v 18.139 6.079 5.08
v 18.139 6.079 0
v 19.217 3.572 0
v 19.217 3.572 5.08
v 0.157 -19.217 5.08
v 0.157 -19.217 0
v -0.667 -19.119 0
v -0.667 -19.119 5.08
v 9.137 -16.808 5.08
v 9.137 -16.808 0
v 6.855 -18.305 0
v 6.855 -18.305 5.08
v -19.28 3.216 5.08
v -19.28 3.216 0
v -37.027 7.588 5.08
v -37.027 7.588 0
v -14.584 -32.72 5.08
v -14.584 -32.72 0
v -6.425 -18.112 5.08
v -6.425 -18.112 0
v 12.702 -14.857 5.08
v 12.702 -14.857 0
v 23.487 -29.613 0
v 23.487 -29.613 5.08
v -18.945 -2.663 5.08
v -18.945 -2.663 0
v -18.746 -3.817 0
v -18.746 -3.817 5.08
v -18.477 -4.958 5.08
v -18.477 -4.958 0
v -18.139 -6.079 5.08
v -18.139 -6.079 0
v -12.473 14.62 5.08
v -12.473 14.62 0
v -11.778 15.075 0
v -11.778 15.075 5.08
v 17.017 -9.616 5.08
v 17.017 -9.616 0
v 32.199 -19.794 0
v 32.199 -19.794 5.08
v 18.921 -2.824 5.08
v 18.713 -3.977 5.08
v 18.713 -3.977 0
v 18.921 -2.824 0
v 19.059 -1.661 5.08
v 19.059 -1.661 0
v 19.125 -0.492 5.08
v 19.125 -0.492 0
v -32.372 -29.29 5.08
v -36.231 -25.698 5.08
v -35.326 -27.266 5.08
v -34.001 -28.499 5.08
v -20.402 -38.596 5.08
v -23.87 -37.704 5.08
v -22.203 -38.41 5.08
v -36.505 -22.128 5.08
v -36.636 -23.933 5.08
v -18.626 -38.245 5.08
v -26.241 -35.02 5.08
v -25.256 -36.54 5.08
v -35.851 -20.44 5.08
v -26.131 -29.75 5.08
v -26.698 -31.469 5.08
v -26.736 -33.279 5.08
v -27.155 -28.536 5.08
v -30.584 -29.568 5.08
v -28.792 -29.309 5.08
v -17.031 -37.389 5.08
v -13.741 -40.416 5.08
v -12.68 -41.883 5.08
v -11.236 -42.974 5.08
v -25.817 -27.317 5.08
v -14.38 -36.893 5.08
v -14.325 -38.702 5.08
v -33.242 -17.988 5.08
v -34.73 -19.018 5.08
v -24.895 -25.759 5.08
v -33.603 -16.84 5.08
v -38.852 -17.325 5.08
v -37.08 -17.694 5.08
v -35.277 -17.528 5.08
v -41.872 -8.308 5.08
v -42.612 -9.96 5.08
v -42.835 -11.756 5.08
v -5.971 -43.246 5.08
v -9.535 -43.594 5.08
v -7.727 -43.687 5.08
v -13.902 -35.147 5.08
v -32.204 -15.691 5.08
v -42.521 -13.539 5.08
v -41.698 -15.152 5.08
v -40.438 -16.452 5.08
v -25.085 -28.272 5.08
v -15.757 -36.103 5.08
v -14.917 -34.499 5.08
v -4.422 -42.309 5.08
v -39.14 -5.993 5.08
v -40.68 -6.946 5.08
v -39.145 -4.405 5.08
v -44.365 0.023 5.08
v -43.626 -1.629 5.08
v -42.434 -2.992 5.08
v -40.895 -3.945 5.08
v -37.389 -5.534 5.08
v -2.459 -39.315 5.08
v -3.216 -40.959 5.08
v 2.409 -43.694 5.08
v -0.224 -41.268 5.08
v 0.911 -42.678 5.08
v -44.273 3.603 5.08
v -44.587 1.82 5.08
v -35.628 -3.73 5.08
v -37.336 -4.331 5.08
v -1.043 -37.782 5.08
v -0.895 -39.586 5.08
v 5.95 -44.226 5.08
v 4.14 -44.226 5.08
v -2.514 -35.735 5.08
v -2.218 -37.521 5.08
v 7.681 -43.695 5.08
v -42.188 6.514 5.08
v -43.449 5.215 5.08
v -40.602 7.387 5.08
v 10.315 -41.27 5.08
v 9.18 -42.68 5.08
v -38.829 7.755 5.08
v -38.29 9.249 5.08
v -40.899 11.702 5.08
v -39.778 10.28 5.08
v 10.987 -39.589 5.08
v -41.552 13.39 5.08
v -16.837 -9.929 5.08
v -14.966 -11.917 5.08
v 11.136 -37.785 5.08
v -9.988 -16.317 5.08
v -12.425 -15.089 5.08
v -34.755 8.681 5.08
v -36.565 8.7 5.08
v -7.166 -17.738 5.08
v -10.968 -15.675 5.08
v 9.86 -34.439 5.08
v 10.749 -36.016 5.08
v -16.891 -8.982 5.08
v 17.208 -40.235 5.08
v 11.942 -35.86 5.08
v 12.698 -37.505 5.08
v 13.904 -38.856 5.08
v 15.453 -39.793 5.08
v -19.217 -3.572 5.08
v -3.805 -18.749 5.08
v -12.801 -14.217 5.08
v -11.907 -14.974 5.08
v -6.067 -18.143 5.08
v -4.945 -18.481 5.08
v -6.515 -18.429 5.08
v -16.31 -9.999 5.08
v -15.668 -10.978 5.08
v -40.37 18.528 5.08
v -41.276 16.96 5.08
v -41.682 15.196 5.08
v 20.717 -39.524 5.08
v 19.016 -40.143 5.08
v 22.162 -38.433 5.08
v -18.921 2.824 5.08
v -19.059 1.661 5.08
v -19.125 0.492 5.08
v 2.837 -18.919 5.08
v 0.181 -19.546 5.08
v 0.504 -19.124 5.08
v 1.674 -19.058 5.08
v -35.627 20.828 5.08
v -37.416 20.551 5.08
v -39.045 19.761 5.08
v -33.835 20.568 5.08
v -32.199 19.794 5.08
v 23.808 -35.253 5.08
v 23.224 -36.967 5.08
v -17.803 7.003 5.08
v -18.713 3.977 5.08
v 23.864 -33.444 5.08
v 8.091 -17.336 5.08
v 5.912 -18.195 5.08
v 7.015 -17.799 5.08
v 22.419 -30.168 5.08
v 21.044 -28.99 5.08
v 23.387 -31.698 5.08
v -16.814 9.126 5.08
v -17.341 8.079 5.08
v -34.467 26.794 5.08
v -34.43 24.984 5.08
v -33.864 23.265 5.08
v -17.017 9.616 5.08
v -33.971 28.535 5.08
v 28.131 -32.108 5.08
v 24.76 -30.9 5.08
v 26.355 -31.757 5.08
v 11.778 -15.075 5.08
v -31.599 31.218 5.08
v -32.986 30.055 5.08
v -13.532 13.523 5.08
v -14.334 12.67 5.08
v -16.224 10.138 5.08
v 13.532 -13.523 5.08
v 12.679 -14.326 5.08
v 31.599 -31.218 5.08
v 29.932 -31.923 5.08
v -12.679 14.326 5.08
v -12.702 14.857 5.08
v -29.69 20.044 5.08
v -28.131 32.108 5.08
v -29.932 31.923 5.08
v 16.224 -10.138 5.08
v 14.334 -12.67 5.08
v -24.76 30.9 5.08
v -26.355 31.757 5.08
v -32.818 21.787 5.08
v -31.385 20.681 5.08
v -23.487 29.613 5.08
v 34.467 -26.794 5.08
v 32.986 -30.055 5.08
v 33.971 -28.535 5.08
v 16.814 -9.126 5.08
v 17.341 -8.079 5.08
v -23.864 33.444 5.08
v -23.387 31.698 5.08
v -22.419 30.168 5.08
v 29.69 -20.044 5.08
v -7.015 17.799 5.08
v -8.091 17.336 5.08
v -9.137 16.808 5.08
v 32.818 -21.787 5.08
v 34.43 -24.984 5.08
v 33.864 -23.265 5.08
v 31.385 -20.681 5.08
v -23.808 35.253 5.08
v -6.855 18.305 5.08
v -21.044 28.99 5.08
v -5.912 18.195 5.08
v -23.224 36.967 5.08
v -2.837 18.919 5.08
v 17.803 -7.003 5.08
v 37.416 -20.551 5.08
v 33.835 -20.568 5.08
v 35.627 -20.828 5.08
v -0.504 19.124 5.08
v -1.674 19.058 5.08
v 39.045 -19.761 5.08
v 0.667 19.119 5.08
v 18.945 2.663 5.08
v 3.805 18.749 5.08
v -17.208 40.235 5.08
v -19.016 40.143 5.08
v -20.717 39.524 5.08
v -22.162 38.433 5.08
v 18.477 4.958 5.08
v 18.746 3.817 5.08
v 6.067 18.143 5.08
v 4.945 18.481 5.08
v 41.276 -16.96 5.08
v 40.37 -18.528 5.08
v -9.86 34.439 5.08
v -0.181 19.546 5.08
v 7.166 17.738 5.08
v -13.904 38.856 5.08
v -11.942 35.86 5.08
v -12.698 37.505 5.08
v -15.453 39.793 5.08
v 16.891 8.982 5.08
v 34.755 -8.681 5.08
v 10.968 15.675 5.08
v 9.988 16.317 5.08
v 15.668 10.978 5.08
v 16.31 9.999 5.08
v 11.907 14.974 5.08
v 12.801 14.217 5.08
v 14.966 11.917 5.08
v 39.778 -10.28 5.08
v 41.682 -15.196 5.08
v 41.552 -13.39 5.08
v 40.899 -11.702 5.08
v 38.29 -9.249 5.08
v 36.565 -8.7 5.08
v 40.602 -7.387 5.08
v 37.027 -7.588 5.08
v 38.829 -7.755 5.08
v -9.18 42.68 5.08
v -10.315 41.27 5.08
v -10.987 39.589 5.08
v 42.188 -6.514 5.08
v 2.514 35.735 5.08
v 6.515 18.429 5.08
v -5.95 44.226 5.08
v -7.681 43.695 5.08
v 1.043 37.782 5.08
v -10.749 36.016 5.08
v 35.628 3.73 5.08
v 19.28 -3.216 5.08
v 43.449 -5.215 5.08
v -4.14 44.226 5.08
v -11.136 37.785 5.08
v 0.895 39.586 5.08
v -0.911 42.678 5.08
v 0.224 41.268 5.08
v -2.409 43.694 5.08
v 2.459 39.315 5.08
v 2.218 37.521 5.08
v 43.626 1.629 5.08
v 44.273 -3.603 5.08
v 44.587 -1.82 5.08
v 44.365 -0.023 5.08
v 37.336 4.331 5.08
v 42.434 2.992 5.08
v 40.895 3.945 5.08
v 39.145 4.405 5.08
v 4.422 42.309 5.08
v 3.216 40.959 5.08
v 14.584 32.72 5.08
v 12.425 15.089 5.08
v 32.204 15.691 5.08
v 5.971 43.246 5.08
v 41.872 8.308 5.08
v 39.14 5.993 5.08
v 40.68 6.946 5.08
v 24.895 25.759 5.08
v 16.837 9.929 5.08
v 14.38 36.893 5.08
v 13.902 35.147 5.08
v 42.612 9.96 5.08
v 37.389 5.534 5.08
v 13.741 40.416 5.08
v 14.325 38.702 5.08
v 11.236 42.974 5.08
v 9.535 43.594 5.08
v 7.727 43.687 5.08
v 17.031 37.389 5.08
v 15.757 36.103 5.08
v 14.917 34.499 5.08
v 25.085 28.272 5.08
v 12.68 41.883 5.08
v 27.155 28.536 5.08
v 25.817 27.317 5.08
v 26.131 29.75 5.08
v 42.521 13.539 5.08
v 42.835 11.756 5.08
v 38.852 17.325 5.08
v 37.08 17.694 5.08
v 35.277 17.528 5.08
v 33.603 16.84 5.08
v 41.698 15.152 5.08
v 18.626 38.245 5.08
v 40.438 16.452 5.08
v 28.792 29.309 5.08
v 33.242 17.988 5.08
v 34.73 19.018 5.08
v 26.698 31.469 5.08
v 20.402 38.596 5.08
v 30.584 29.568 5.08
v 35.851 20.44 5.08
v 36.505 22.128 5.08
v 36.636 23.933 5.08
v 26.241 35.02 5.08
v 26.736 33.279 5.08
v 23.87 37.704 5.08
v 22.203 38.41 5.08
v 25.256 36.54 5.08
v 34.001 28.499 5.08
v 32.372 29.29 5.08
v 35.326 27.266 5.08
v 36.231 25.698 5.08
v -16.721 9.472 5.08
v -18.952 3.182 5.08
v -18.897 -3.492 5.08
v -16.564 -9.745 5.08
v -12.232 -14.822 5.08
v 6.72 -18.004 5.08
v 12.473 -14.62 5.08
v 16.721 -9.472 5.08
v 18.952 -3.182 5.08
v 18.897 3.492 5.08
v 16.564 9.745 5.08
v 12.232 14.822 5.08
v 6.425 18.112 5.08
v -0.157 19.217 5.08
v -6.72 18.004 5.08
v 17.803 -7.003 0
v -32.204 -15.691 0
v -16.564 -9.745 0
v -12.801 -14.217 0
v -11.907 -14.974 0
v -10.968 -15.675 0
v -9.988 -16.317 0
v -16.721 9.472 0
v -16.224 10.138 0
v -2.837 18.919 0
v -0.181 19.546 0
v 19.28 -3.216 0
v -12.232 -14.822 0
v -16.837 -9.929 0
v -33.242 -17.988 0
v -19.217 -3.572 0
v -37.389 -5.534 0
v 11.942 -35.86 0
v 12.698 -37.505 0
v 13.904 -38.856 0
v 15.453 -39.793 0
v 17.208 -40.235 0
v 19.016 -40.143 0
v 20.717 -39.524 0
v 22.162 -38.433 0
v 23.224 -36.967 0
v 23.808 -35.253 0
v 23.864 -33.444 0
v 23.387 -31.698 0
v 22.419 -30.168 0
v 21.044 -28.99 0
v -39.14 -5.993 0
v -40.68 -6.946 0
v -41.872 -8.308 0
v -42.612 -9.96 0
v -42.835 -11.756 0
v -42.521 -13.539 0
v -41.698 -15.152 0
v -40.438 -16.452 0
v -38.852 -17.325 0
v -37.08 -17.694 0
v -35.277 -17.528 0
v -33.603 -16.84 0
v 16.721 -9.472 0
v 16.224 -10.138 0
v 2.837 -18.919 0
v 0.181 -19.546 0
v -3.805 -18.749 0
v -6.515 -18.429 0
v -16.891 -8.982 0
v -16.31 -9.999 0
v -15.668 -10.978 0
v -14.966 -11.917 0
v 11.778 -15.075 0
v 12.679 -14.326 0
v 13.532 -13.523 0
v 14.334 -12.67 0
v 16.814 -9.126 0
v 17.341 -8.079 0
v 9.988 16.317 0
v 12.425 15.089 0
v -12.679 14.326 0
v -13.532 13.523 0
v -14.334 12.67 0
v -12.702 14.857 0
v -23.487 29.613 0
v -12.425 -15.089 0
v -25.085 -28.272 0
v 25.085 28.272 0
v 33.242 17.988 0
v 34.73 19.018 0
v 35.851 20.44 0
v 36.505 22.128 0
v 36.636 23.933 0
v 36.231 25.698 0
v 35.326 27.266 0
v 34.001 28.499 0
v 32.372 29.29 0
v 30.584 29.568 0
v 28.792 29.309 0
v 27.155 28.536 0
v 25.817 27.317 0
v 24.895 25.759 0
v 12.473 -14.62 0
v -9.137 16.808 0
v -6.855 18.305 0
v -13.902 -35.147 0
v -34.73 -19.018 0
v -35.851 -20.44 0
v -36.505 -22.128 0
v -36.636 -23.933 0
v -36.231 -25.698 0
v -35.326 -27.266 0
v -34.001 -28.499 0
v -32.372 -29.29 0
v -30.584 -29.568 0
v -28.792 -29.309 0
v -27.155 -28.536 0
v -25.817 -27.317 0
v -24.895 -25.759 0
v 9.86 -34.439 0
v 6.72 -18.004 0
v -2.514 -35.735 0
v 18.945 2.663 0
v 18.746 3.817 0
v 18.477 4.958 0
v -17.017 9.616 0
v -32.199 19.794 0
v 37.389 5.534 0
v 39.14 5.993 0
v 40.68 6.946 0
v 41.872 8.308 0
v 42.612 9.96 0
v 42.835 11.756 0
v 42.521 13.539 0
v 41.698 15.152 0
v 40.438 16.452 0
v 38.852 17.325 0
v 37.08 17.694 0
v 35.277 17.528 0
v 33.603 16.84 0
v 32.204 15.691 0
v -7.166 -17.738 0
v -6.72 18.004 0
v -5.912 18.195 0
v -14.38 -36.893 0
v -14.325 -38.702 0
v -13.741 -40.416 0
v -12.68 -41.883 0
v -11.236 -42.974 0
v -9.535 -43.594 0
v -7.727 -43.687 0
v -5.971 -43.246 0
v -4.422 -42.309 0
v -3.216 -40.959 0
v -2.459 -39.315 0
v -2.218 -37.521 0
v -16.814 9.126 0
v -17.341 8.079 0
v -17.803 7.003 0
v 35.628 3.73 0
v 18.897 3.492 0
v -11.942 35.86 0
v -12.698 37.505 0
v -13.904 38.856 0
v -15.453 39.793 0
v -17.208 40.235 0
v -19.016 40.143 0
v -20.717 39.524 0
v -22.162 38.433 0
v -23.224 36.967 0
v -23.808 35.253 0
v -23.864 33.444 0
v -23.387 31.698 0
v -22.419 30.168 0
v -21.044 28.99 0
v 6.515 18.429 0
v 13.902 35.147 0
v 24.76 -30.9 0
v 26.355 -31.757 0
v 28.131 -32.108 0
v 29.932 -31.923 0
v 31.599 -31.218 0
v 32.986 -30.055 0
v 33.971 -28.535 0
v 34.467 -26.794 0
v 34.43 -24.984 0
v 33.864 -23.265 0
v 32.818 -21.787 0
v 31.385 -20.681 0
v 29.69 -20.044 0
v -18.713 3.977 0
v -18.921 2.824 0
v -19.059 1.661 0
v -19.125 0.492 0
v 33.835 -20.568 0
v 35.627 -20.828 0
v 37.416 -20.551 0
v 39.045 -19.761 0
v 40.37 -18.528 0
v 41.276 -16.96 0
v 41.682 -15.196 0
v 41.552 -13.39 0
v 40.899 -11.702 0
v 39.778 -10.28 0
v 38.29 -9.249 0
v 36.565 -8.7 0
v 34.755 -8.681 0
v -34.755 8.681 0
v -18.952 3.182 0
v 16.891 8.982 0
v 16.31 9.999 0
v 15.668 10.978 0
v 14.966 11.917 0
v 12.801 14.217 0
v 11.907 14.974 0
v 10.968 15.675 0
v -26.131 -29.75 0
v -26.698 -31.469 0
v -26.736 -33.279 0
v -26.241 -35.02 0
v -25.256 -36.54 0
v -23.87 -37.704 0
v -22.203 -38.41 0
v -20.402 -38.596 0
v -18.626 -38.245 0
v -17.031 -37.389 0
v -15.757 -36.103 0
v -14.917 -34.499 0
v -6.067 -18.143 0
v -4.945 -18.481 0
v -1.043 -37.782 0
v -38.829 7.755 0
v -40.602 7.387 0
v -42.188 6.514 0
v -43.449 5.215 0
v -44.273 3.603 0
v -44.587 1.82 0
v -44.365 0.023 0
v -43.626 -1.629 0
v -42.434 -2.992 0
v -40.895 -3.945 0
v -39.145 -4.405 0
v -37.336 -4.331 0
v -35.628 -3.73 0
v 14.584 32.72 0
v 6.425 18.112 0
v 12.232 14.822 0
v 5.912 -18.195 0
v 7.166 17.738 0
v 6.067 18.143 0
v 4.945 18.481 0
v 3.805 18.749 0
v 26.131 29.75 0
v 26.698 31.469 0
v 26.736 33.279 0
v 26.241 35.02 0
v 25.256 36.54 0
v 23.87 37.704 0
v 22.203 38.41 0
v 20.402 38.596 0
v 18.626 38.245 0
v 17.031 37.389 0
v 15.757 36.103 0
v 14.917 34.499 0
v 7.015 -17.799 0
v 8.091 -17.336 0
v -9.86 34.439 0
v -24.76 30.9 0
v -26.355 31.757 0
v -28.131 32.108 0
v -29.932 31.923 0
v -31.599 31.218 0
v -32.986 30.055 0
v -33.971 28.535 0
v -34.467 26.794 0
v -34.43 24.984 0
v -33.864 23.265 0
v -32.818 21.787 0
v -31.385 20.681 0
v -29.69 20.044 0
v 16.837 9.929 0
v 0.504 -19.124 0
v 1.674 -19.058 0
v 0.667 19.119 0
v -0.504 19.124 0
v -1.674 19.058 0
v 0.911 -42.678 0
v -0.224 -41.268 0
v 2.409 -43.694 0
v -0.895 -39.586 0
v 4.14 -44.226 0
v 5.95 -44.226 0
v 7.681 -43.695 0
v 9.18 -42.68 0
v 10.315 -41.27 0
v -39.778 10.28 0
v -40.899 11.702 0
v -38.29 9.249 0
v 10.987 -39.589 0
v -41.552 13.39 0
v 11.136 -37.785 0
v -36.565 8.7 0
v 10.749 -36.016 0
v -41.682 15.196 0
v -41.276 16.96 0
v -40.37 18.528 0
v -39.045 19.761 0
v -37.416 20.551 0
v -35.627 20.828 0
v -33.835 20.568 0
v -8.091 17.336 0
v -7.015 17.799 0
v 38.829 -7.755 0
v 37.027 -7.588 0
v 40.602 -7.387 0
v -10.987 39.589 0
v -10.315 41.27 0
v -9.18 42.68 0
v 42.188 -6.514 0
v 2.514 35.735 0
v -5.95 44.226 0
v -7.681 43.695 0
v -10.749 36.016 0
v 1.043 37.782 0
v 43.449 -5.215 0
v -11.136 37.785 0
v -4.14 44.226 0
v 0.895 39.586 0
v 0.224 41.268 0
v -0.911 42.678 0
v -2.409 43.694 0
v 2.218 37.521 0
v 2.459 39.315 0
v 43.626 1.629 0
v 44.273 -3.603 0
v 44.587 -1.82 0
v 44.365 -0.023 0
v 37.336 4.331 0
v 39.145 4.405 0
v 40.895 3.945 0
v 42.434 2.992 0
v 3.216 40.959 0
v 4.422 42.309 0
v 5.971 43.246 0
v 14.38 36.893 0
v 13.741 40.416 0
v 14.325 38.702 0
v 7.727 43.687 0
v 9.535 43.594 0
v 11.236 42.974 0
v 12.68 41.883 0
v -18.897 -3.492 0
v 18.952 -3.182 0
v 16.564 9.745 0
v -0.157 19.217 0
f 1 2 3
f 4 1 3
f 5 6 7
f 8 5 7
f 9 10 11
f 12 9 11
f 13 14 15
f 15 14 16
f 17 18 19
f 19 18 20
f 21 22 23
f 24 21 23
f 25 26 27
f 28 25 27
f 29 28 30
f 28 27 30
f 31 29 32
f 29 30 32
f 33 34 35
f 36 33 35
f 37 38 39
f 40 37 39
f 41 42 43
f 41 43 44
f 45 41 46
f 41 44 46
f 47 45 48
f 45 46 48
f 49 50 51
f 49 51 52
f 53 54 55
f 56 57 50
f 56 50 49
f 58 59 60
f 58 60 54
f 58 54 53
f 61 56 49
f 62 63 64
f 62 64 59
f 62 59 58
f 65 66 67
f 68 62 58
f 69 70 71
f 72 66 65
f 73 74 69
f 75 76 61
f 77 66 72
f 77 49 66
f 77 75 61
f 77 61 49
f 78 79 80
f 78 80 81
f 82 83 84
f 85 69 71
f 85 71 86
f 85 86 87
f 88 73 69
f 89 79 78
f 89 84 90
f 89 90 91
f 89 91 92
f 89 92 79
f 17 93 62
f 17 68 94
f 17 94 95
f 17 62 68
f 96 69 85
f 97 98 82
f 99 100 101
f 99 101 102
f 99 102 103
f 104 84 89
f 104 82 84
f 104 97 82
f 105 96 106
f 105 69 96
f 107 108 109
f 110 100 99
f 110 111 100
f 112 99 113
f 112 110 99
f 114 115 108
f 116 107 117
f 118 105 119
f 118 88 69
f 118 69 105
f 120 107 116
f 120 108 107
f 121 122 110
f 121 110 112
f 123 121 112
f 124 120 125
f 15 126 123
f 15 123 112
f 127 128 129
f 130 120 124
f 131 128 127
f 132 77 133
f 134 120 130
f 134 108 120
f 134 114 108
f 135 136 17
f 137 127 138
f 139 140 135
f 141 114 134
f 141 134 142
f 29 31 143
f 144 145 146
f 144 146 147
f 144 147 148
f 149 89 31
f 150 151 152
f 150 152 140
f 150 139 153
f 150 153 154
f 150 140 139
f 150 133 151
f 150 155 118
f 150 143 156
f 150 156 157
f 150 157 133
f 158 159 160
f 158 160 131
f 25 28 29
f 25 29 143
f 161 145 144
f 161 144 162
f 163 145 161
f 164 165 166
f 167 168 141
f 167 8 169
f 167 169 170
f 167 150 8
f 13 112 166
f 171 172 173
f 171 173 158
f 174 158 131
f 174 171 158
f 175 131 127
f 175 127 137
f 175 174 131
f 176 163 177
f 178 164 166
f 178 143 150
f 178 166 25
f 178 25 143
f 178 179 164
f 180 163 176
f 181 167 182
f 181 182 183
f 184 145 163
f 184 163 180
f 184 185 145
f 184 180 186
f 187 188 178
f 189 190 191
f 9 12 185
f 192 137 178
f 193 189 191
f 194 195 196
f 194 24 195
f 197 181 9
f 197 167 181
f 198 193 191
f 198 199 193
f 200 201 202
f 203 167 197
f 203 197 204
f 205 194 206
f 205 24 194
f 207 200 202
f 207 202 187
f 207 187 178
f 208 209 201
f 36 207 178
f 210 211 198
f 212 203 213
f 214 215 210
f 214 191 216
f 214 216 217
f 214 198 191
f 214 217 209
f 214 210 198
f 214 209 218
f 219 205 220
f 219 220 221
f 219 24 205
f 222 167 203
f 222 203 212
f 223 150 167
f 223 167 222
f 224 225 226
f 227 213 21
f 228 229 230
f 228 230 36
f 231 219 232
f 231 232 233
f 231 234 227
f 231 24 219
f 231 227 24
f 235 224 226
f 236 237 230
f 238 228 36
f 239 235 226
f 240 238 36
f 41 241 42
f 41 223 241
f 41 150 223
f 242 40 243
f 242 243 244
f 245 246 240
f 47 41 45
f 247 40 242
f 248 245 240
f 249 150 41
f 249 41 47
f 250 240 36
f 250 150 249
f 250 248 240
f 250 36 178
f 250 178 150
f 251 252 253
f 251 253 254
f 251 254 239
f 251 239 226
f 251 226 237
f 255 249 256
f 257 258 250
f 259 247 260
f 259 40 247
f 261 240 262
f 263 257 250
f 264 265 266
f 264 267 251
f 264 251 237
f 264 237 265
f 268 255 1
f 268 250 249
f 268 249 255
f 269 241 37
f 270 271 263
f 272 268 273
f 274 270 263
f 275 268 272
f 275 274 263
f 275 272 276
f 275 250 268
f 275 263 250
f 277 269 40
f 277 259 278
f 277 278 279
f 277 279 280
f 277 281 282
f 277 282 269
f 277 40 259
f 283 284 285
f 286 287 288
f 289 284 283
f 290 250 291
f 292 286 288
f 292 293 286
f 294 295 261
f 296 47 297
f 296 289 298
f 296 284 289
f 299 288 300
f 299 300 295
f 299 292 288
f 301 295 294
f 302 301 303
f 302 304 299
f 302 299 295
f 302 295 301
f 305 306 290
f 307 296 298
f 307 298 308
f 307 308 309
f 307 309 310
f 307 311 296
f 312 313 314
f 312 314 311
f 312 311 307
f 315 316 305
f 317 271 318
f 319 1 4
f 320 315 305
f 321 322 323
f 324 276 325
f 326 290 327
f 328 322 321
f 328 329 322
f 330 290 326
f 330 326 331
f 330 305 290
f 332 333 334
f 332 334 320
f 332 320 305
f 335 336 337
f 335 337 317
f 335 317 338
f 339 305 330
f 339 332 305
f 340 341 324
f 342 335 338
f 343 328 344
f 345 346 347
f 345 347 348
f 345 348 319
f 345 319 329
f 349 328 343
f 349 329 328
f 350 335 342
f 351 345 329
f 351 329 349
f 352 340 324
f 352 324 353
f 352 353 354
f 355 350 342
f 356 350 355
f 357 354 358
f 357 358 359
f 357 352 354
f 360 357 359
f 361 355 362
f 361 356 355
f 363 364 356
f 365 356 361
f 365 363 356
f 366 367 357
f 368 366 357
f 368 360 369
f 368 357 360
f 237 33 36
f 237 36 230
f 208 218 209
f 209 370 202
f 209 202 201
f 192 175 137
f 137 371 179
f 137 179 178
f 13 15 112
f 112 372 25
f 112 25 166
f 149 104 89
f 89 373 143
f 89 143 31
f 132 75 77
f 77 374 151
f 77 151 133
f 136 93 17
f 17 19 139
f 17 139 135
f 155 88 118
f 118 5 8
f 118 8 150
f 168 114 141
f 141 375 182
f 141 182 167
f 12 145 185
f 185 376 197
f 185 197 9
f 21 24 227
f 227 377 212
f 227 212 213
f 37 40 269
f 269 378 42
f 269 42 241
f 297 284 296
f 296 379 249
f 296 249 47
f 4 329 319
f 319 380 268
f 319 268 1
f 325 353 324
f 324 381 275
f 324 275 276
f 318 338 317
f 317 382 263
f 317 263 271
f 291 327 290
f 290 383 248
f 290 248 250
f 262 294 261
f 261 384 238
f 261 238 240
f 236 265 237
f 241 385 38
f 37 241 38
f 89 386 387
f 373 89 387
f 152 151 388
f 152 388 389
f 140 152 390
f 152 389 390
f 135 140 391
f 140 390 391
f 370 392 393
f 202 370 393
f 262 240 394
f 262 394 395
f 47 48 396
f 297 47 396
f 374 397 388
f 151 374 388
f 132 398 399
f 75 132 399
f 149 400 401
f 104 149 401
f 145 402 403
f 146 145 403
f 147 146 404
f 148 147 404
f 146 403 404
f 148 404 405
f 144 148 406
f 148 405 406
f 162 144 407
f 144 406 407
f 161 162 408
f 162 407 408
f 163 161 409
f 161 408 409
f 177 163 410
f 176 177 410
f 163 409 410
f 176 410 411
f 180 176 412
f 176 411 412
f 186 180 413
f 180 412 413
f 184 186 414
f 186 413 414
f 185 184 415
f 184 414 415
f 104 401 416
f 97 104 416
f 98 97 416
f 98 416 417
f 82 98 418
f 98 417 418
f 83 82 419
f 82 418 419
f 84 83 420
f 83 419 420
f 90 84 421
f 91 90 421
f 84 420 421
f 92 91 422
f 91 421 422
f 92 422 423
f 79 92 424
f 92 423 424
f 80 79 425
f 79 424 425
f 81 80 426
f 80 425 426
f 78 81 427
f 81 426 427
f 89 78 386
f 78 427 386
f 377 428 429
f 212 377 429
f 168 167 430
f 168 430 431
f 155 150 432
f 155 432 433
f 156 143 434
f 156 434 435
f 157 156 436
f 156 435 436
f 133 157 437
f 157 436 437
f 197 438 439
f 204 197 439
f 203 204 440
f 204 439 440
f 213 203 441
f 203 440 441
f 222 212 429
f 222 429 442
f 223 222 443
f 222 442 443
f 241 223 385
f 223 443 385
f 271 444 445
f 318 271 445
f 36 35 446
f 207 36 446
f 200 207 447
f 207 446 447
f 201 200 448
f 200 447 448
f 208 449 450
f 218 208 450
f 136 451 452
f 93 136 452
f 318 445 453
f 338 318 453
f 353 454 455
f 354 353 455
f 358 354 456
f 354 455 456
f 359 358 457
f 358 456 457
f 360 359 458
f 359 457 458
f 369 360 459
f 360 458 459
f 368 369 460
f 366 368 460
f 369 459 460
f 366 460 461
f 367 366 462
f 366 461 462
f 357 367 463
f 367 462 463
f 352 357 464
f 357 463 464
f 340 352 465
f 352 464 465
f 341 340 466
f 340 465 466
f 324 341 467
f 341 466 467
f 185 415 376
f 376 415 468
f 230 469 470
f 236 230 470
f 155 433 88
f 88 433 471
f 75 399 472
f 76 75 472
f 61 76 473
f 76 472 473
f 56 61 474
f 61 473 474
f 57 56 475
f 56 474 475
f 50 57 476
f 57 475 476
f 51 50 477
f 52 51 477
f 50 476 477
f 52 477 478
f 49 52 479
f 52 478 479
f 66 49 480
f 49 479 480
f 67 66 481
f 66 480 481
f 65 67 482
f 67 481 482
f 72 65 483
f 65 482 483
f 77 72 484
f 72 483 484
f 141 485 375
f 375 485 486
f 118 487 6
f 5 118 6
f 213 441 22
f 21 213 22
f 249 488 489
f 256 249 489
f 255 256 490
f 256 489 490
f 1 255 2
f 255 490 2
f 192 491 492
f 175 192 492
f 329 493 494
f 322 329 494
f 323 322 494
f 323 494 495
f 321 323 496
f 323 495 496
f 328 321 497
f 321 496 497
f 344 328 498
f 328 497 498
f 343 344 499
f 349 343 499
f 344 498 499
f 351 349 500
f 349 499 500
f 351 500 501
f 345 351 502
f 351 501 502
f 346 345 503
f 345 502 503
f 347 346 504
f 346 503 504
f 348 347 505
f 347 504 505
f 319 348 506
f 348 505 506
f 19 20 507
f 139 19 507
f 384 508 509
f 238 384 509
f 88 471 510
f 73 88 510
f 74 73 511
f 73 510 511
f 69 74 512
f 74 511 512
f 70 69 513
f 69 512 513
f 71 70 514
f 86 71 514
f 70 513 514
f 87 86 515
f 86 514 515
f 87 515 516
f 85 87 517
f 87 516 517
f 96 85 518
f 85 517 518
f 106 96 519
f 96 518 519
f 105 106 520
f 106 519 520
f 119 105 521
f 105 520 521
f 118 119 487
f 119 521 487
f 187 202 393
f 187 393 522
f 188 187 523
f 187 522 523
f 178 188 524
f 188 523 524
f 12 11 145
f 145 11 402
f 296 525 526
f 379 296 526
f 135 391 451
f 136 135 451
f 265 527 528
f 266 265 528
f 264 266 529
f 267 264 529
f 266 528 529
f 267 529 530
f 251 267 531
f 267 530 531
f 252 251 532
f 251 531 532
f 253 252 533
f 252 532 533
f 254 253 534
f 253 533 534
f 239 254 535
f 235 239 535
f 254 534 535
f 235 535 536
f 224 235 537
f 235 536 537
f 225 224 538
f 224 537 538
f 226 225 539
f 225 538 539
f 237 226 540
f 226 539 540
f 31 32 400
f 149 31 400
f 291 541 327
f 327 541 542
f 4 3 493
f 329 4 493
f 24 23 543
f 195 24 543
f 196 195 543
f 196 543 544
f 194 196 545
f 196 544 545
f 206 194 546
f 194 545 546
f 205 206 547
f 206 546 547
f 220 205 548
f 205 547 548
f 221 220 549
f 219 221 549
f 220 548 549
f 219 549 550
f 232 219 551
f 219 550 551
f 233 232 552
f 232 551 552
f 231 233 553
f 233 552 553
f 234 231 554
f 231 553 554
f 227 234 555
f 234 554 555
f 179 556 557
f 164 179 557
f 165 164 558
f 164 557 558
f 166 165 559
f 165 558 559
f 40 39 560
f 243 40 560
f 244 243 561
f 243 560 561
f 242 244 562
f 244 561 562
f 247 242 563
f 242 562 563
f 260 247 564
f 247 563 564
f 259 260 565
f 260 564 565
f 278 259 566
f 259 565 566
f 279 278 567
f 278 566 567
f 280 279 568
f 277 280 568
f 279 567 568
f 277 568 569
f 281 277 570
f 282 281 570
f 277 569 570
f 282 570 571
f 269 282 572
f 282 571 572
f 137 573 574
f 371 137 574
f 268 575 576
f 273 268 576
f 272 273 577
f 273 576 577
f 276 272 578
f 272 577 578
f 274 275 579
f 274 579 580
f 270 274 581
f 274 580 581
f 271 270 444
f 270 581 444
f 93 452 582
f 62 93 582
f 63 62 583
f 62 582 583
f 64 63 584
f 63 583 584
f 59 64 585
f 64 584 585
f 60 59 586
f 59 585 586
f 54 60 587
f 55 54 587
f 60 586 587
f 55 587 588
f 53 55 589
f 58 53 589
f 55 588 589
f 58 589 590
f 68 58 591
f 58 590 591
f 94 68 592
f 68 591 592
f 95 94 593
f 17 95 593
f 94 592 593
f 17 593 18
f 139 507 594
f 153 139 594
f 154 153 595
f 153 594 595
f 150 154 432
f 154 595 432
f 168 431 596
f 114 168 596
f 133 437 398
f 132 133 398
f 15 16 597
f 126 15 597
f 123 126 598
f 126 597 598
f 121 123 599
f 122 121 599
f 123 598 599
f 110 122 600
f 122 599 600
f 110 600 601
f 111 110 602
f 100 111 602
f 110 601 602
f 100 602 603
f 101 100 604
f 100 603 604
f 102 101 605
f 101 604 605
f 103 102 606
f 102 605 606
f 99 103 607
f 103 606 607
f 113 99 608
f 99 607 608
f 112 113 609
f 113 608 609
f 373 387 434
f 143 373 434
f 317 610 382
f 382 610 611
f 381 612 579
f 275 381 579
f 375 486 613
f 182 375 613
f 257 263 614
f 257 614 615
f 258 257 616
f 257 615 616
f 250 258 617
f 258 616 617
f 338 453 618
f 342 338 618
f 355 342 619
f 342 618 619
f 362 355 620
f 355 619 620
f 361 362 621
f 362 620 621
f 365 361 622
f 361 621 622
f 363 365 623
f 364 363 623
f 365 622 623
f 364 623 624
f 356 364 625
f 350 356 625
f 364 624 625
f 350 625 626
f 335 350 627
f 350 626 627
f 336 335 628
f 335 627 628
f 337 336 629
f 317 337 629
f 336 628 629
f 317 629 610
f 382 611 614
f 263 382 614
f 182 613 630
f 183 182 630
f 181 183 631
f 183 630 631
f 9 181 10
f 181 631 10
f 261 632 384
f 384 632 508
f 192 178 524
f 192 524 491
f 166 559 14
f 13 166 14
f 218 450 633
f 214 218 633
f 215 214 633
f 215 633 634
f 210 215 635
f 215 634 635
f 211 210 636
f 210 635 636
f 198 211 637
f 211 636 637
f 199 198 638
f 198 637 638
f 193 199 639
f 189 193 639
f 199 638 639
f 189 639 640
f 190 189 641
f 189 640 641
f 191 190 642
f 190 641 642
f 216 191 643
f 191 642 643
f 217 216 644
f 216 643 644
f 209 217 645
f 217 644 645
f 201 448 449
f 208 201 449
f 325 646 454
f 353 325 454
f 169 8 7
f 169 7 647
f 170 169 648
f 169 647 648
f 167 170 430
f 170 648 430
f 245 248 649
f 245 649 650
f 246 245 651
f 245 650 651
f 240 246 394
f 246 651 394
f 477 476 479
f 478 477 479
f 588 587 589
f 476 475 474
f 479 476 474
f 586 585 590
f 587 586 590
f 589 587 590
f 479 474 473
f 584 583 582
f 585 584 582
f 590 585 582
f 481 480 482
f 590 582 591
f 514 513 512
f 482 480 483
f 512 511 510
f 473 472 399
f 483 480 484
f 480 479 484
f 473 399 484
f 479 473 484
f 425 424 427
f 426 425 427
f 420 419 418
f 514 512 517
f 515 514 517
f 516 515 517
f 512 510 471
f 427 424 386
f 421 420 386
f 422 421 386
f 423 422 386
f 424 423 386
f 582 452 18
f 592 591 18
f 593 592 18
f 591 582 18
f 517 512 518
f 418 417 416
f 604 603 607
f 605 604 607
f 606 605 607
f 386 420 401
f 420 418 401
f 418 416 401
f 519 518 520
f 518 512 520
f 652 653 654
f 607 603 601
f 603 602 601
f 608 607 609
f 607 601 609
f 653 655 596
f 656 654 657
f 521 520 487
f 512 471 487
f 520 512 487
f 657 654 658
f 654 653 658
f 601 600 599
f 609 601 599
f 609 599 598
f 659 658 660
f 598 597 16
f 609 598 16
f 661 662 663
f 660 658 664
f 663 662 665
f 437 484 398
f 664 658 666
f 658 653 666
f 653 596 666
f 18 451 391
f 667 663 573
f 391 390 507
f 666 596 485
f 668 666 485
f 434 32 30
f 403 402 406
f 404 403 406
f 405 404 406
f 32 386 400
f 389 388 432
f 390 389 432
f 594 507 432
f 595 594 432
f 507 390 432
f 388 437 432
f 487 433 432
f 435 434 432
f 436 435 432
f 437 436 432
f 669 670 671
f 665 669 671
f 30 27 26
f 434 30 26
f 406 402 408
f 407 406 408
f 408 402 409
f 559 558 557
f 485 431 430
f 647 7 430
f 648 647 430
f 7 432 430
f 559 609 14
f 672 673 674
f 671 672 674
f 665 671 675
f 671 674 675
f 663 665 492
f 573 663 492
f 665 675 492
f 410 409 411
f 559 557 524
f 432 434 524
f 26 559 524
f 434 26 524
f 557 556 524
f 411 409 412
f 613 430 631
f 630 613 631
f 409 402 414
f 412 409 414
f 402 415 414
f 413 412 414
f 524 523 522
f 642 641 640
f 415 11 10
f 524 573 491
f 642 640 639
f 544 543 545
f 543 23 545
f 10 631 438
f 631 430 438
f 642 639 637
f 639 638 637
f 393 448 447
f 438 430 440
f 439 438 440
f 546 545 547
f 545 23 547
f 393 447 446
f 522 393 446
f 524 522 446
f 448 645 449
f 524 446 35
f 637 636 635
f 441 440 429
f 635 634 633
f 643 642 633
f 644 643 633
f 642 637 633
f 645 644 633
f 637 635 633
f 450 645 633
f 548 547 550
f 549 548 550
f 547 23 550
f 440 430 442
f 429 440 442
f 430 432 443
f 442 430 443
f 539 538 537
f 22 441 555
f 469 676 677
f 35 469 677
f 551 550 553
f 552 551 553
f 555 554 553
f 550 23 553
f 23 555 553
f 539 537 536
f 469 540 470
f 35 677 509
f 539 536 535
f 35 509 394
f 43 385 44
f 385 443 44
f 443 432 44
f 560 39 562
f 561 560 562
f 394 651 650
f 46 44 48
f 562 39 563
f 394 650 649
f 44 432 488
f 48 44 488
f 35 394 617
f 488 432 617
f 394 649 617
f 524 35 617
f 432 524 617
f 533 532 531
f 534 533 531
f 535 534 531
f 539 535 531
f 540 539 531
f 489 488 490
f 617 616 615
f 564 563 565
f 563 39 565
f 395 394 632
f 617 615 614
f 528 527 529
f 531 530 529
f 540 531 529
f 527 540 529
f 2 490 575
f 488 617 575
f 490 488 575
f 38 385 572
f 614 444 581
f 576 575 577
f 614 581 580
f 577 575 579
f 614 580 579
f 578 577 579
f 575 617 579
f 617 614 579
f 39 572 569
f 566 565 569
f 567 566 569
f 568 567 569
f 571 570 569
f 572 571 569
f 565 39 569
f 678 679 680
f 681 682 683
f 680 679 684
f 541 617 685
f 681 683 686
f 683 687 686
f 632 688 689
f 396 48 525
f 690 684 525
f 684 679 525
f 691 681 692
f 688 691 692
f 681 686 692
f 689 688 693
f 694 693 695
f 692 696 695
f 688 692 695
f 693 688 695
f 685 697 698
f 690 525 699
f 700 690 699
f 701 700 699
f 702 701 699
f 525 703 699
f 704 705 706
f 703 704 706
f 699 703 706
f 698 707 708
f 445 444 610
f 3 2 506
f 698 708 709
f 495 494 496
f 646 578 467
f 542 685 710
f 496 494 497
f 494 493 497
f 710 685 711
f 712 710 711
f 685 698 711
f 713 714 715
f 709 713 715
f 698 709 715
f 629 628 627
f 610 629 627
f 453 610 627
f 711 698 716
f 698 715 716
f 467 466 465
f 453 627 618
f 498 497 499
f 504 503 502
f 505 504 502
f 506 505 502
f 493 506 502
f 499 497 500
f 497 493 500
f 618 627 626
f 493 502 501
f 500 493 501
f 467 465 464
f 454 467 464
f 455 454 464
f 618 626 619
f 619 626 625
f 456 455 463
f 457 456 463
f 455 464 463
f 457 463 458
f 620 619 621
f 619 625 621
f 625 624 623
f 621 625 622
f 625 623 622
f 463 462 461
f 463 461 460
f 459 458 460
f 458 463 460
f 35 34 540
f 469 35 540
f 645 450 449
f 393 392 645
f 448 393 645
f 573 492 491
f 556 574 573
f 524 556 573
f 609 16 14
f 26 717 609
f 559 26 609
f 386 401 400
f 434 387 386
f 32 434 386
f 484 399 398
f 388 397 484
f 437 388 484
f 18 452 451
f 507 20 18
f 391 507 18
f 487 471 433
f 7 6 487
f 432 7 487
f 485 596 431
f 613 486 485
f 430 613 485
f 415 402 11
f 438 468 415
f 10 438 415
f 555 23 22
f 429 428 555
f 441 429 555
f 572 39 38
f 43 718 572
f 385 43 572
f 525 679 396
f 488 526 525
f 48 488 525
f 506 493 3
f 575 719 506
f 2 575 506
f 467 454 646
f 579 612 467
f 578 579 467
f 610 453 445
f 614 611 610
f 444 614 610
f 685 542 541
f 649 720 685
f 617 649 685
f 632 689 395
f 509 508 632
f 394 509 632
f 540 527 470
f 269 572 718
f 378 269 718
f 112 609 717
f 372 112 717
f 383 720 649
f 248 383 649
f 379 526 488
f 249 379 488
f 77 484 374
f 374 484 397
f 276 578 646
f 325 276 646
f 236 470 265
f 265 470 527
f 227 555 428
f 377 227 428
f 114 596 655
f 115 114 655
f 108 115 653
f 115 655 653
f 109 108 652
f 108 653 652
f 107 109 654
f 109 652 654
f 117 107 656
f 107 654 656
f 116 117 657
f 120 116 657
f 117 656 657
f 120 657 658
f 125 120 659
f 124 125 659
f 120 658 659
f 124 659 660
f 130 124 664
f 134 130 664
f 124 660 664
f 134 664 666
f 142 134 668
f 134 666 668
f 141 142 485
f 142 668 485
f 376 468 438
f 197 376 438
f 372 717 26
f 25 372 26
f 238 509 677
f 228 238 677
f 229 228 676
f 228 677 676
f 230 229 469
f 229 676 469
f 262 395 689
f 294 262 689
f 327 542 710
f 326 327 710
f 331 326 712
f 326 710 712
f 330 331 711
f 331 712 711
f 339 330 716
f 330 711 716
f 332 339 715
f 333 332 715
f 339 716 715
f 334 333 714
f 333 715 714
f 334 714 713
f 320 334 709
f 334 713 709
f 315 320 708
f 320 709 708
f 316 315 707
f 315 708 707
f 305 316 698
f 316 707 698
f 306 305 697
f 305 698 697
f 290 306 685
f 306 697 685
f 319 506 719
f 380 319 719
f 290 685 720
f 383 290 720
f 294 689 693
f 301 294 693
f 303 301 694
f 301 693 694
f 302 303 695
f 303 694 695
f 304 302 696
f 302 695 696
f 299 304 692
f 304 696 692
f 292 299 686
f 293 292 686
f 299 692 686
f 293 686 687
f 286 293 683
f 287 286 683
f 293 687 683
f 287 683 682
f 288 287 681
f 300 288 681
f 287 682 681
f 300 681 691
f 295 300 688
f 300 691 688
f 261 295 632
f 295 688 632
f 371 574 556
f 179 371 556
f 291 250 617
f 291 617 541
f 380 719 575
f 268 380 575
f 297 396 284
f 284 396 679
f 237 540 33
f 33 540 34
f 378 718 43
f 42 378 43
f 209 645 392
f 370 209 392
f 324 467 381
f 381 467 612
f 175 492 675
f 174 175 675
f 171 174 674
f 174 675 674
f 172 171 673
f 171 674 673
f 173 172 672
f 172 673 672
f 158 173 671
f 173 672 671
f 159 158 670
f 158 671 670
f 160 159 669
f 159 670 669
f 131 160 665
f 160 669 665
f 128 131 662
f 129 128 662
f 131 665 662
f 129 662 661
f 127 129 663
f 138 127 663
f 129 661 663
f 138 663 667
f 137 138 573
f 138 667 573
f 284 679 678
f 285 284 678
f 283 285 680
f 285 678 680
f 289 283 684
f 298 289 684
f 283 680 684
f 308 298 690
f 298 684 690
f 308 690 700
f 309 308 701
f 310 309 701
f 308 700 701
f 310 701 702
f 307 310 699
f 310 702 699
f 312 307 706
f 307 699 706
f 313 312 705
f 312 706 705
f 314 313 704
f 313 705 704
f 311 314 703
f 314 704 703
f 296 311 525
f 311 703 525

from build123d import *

# Parameters (mm, degrees)
F0_R     = 19.130966
F2_DEPTH = 5.08
F3_DEPTH = 5.08


with BuildPart() as f2:
    # F0 (on Top) → F2 (new body)
    with BuildSketch(Plane.XY):
        Circle(F0_R)
    extrude(amount=F2_DEPTH)

    # F1 (on Top) → F3 (join)
    with BuildSketch(Plane.XY):
        with BuildLine():
            Line((-21.044278, 28.989919), (-12.472797, 14.619729))
            Line((-12.472797, 14.619729), (-6.8548, 18.305056))
            Line((-6.8548, 18.305056), (-11.942245, 35.860111))
            ThreePointArc((-11.942245, 35.860111), (-21.48052, 39.032428), (-21.044278, 28.989919))
        make_face()
        with BuildLine():
            Line((-9.860016, 34.43918), (-6.720354, 18.003999))
            Line((-6.720354, 18.003999), (-0.180707, 19.545606))
            Line((-0.180707, 19.545606), (1.042841, 37.78197))
            ThreePointArc((1.042841, 37.78197), (-6.83521, 44.025255), (-9.860016, 34.43918))
        make_face()
        with BuildLine():
            Line((2.513509, 35.734568), (-0.157337, 19.216722))
            Line((-0.157337, 19.216722), (6.515182, 18.428667))
            Line((6.515182, 18.428667), (13.902145, 35.146766))
            ThreePointArc((13.902145, 35.146766), (8.634528, 43.707987), (2.513509, 35.734568))
        make_face()
        with BuildLine():
            Line((14.583868, 32.719839), (6.424658, 18.111624))
            Line((6.424658, 18.111624), (12.425244, 15.088959))
            Line((12.425244, 15.088959), (25.084645, 28.272343))
            ThreePointArc((25.084645, 28.272343), (23.062814, 38.11889), (14.583868, 32.719839))
        make_face()
        with BuildLine():
            Line((12.231744, 14.821997), (16.836638, 9.929299))
            Line((16.836638, 9.929299), (33.241566, 17.987859))
            ThreePointArc((33.241566, 17.987859), (34.709385, 27.932093), (24.895197, 25.758615))
            Line((24.895197, 25.758615), (12.231744, 14.821997))
        make_face()
        with BuildLine():
            Line((32.203798, 15.690521), (16.563501, 9.744618))
            Line((16.563501, 9.744618), (19.217285, 3.57202))
            Line((19.217285, 3.57202), (37.389064, 5.533773))
            ThreePointArc((37.389064, 5.533773), (42.169491, 14.376273), (32.203798, 15.690521))
        make_face()
        with BuildLine():
            Line((35.628146, 3.72992), (18.897455, 3.491895))
            Line((18.897455, 3.491895), (19.280043, -3.216097))
            Line((19.280043, -3.216097), (37.02689, -7.587768))
            ThreePointArc((37.02689, -7.587768), (44.543335, -0.913538), (35.628146, 3.72992))
        make_face()
        with BuildLine():
            Line((34.755213, -8.680565), (18.952098, -3.182002))
            Line((18.952098, -3.182002), (17.017344, -9.616306))
            Line((17.017344, -9.616306), (32.198726, -19.794112))
            ThreePointArc((32.198726, -19.794112), (41.544595, -16.093162), (34.755213, -8.680565))
        make_face()
        with BuildLine():
            Line((29.690289, -20.044046), (16.720838, -9.472103))
            Line((16.720838, -9.472103), (12.702102, -14.856647))
            Line((12.702102, -14.856647), (23.48692, -29.612993))
            ThreePointArc((23.48692, -29.612993), (33.534963, -29.331714), (29.690289, -20.044046))
        make_face()
        with BuildLine():
            Line((21.044278, -28.989919), (12.472797, -14.619729))
            Line((12.472797, -14.619729), (6.8548, -18.305056))
            Line((6.8548, -18.305056), (11.942245, -35.860111))
            ThreePointArc((11.942245, -35.860111), (21.48052, -39.032428), (21.044278, -28.989919))
        make_face()
        with BuildLine():
            Line((9.860016, -34.43918), (6.720354, -18.003999))
            Line((6.720354, -18.003999), (0.180707, -19.545606))
            Line((0.180707, -19.545606), (-1.042841, -37.78197))
            ThreePointArc((-1.042841, -37.78197), (6.83521, -44.025255), (9.860016, -34.43918))
        make_face()
        with BuildLine():
            Line((-2.513509, -35.734568), (0.157337, -19.216722))
            Line((0.157337, -19.216722), (-6.515182, -18.428667))
            Line((-6.515182, -18.428667), (-13.902145, -35.146766))
            ThreePointArc((-13.902145, -35.146766), (-8.634528, -43.707987), (-2.513509, -35.734568))
        make_face()
        with BuildLine():
            Line((-14.583868, -32.719839), (-6.424658, -18.111624))
            Line((-6.424658, -18.111624), (-12.425244, -15.088959))
            Line((-12.425244, -15.088959), (-25.084645, -28.272343))
            ThreePointArc((-25.084645, -28.272343), (-23.062814, -38.11889), (-14.583868, -32.719839))
        make_face()
        with BuildLine():
            Line((-24.895197, -25.758615), (-12.231744, -14.821997))
            Line((-12.231744, -14.821997), (-16.836638, -9.929299))
            Line((-16.836638, -9.929299), (-33.241566, -17.987859))
            ThreePointArc((-33.241566, -17.987859), (-34.709385, -27.932093), (-24.895197, -25.758615))
        make_face()
        with BuildLine():
            Line((-34.755213, 8.680565), (-18.952098, 3.182002))
            Line((-18.952098, 3.182002), (-17.017344, 9.616306))
            Line((-17.017344, 9.616306), (-32.198726, 19.794112))
            ThreePointArc((-32.198726, 19.794112), (-41.544595, 16.093162), (-34.755213, 8.680565))
        make_face()
        with BuildLine():
            Line((-29.690289, 20.044046), (-16.720838, 9.472103))
            Line((-16.720838, 9.472103), (-12.702102, 14.856647))
            Line((-12.702102, 14.856647), (-23.48692, 29.612993))
            ThreePointArc((-23.48692, 29.612993), (-33.534963, 29.331714), (-29.690289, 20.044046))
        make_face()
        with BuildLine():
            Line((-35.628146, -3.72992), (-18.897455, -3.491895))
            Line((-18.897455, -3.491895), (-19.280043, 3.216097))
            Line((-19.280043, 3.216097), (-37.02689, 7.587768))
            ThreePointArc((-37.02689, 7.587768), (-44.543335, 0.913538), (-35.628146, -3.72992))
        make_face()
        with BuildLine():
            Line((-32.203798, -15.690521), (-16.563501, -9.744618))
            Line((-16.563501, -9.744618), (-19.217285, -3.57202))
            Line((-19.217285, -3.57202), (-37.389064, -5.533773))
            ThreePointArc((-37.389064, -5.533773), (-42.169491, -14.376273), (-32.203798, -15.690521))
        make_face()
    extrude(amount=F3_DEPTH)


solid = f2.part
